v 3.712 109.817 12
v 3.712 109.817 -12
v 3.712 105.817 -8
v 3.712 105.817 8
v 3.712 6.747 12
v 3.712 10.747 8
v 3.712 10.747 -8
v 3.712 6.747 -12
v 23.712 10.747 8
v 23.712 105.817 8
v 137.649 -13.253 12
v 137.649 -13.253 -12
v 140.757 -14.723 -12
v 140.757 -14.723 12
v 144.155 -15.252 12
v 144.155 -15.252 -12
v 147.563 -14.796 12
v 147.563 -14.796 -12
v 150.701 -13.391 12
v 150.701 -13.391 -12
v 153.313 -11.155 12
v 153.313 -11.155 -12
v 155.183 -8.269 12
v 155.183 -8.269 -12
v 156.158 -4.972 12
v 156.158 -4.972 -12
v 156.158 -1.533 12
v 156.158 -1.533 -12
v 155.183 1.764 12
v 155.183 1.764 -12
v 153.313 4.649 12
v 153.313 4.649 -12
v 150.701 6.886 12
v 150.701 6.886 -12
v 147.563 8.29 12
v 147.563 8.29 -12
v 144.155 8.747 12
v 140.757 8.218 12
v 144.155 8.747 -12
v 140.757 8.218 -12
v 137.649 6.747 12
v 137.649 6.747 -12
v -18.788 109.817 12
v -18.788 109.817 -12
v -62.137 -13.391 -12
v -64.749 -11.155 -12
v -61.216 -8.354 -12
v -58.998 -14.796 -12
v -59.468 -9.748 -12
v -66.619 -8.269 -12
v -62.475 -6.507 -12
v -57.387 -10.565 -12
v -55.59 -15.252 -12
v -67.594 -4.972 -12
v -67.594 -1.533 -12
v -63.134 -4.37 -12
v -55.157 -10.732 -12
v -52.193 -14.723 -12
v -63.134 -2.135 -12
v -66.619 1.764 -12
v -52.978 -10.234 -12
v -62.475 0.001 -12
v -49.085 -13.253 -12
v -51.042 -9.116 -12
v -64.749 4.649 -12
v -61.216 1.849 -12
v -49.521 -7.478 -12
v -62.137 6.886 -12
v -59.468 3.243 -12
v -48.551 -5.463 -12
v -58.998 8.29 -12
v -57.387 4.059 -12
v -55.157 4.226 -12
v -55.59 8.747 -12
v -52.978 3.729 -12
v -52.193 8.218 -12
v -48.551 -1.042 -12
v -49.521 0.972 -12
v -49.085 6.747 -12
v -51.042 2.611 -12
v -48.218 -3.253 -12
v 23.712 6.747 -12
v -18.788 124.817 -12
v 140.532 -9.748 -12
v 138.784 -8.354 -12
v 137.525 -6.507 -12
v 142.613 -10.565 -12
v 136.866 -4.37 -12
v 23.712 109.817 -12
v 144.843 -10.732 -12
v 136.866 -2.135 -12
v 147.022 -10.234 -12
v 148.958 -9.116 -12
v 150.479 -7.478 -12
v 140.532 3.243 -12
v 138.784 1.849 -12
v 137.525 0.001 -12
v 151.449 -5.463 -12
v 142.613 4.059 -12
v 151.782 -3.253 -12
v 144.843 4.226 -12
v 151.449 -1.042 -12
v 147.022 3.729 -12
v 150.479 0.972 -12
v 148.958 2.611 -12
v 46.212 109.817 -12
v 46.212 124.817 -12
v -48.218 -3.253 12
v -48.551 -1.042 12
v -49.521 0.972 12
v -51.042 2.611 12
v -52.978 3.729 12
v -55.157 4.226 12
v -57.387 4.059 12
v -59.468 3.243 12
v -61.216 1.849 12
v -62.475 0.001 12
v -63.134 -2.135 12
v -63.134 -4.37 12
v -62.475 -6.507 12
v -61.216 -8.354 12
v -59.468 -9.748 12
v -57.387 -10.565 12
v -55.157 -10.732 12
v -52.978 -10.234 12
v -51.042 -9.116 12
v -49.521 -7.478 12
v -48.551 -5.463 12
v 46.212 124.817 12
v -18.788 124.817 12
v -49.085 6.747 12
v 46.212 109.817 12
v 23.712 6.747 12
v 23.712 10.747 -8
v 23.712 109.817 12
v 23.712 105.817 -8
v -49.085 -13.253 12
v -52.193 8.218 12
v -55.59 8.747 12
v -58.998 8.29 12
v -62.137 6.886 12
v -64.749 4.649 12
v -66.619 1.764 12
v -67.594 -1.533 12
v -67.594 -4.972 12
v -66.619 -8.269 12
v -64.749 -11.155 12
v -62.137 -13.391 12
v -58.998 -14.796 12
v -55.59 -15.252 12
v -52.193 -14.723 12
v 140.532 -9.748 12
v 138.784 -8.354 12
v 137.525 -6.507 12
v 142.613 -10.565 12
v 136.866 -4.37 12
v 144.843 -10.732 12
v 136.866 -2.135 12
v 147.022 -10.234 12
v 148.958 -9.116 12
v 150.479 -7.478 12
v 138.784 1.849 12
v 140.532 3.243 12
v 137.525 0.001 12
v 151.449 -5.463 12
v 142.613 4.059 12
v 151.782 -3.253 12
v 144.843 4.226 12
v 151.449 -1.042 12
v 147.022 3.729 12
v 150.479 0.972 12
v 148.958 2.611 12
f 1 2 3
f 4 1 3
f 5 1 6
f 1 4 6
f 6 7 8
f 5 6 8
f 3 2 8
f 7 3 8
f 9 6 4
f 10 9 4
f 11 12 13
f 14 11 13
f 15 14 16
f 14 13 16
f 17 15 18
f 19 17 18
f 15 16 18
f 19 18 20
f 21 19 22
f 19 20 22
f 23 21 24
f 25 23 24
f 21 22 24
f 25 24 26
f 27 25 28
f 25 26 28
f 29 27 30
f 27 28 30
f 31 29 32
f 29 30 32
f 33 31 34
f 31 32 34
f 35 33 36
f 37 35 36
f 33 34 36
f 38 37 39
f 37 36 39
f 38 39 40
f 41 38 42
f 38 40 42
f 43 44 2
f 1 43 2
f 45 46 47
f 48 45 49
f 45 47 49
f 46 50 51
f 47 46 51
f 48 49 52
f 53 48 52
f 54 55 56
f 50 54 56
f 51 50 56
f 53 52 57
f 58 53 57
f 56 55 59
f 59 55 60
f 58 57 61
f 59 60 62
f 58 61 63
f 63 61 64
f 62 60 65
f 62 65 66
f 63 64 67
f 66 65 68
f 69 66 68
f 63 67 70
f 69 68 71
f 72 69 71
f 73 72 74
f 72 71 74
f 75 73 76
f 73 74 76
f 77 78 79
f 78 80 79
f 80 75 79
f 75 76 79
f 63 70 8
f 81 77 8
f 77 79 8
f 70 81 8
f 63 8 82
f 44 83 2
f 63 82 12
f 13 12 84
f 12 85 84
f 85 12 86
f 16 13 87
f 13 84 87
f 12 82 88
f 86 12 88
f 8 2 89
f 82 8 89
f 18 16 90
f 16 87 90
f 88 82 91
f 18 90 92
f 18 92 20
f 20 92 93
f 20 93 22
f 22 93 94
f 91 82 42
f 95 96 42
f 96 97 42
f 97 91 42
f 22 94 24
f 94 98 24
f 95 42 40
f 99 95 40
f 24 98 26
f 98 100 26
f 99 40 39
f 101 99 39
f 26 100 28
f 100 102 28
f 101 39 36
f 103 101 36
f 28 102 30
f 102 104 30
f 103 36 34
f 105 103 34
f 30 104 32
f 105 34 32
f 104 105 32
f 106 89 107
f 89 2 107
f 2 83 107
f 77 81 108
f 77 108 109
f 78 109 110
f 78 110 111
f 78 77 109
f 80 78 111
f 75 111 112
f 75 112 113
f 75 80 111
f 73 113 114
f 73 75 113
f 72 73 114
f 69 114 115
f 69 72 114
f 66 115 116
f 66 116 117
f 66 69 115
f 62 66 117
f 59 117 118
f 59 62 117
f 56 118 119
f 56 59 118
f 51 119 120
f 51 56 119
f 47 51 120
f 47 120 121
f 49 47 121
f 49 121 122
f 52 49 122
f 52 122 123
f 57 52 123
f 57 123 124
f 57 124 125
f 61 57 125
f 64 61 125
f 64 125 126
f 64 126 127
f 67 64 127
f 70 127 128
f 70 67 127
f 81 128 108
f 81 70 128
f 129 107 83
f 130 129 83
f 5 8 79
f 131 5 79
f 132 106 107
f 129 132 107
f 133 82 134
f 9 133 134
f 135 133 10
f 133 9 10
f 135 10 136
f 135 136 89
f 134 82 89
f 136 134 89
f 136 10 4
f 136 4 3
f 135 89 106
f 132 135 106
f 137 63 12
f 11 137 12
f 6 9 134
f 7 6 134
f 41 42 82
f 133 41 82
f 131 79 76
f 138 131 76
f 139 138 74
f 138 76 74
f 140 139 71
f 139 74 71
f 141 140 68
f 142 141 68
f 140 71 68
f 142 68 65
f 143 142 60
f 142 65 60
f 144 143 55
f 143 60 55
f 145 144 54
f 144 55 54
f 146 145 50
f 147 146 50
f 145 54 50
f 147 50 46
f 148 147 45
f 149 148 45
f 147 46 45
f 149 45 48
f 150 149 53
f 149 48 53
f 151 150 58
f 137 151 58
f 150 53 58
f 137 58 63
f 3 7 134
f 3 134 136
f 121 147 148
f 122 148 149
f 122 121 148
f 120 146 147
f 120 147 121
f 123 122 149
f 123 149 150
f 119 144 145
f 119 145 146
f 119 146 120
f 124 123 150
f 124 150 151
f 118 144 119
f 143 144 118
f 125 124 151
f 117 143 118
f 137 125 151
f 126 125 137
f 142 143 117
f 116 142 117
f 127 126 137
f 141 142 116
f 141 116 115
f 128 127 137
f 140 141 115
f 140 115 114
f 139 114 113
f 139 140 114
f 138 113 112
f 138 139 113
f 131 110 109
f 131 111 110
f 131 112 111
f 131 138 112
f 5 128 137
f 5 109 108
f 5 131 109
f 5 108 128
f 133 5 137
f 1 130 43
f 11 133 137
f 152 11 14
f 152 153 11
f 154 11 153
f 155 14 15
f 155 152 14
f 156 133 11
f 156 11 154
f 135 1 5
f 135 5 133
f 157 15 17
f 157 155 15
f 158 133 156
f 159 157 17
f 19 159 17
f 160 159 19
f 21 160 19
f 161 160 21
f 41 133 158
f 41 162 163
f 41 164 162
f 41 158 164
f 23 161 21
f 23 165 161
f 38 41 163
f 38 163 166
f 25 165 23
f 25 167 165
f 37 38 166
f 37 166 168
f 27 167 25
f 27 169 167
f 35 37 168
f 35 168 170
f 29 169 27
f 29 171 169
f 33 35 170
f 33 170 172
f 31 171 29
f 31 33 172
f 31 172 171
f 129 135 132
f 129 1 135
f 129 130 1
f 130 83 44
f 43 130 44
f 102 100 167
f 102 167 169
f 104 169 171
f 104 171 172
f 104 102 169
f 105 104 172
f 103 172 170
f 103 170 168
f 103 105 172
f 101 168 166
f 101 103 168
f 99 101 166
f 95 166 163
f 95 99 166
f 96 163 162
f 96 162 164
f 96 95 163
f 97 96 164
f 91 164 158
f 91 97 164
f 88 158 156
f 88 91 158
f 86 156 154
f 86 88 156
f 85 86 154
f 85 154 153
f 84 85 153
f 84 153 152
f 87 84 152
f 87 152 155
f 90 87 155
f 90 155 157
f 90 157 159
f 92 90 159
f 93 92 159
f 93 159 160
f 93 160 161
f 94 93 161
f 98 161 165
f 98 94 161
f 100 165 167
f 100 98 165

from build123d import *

# Parameters (mm, degrees)
BOSS_EXTRUDE1_DEPTH      = 12
BOSS_EXTRUDE1_DEPTH_BACK = 12
SKETCH1_R                = 7.5
CUT_EXTRUDE1_DEPTH       = 183.477874792
CUT_EXTRUDE1_DEPTH_BACK  = 183.477874792
SKETCH2_W                = 16
SKETCH2_H                = 95.07


with BuildPart() as part:
    # Sketch1 → Boss-Extrude1 (new, two sides: drawn at the far end of the back side and taken through both)
    with BuildSketch(Plane.XY.offset(-BOSS_EXTRUDE1_DEPTH_BACK)):
        with BuildLine():
            ThreePointArc((-49.084636864, 6.747346105), (-67.717886444, -3.252653895), (-49.084636864, -13.252653895))
            Line((-49.084636864, -13.252653895), (137.648863975, -13.252653895))
            ThreePointArc((137.648863975, -13.252653895), (156.282113556, -3.252653895), (137.648863975, 6.747346105))
            Line((137.648863975, 6.747346105), (23.712113556, 6.747346105))
            Line((23.712113556, 6.747346105), (23.712113556, 109.817346105))
            Line((23.712113556, 109.817346105), (46.212113556, 109.817346105))
            Line((46.212113556, 109.817346105), (46.212113556, 124.817346105))
            Line((46.212113556, 124.817346105), (-18.787886444, 124.817346105))
            Line((-18.787886444, 124.817346105), (-18.787886444, 109.817346105))
            Line((-18.787886444, 109.817346105), (3.712113556, 109.817346105))
            Line((3.712113556, 109.817346105), (3.712113556, 6.747346105))
            Line((3.712113556, 6.747346105), (-49.084636864, 6.747346105))
        make_face()
        with Locations((-55.717886444, -3.252653895)):
            Circle(SKETCH1_R, mode=Mode.SUBTRACT)
        with Locations((144.282113556, -3.252653895)):
            Circle(SKETCH1_R, mode=Mode.SUBTRACT)
    extrude(amount=BOSS_EXTRUDE1_DEPTH + BOSS_EXTRUDE1_DEPTH_BACK)

    # Sketch2 → Cut-Extrude1 (cut, two sides: drawn at the far end of the back side and taken through both)
    with BuildSketch(Plane(origin=(23.712113556, 0, 0), x_dir=(0, 0, -1), z_dir=(1, 0, 0)).offset(-CUT_EXTRUDE1_DEPTH_BACK)):
        with Locations((0, 58.282346105)):
            Rectangle(SKETCH2_W, SKETCH2_H)
    extrude(amount=CUT_EXTRUDE1_DEPTH + CUT_EXTRUDE1_DEPTH_BACK, mode=Mode.SUBTRACT)


solid = part.part
